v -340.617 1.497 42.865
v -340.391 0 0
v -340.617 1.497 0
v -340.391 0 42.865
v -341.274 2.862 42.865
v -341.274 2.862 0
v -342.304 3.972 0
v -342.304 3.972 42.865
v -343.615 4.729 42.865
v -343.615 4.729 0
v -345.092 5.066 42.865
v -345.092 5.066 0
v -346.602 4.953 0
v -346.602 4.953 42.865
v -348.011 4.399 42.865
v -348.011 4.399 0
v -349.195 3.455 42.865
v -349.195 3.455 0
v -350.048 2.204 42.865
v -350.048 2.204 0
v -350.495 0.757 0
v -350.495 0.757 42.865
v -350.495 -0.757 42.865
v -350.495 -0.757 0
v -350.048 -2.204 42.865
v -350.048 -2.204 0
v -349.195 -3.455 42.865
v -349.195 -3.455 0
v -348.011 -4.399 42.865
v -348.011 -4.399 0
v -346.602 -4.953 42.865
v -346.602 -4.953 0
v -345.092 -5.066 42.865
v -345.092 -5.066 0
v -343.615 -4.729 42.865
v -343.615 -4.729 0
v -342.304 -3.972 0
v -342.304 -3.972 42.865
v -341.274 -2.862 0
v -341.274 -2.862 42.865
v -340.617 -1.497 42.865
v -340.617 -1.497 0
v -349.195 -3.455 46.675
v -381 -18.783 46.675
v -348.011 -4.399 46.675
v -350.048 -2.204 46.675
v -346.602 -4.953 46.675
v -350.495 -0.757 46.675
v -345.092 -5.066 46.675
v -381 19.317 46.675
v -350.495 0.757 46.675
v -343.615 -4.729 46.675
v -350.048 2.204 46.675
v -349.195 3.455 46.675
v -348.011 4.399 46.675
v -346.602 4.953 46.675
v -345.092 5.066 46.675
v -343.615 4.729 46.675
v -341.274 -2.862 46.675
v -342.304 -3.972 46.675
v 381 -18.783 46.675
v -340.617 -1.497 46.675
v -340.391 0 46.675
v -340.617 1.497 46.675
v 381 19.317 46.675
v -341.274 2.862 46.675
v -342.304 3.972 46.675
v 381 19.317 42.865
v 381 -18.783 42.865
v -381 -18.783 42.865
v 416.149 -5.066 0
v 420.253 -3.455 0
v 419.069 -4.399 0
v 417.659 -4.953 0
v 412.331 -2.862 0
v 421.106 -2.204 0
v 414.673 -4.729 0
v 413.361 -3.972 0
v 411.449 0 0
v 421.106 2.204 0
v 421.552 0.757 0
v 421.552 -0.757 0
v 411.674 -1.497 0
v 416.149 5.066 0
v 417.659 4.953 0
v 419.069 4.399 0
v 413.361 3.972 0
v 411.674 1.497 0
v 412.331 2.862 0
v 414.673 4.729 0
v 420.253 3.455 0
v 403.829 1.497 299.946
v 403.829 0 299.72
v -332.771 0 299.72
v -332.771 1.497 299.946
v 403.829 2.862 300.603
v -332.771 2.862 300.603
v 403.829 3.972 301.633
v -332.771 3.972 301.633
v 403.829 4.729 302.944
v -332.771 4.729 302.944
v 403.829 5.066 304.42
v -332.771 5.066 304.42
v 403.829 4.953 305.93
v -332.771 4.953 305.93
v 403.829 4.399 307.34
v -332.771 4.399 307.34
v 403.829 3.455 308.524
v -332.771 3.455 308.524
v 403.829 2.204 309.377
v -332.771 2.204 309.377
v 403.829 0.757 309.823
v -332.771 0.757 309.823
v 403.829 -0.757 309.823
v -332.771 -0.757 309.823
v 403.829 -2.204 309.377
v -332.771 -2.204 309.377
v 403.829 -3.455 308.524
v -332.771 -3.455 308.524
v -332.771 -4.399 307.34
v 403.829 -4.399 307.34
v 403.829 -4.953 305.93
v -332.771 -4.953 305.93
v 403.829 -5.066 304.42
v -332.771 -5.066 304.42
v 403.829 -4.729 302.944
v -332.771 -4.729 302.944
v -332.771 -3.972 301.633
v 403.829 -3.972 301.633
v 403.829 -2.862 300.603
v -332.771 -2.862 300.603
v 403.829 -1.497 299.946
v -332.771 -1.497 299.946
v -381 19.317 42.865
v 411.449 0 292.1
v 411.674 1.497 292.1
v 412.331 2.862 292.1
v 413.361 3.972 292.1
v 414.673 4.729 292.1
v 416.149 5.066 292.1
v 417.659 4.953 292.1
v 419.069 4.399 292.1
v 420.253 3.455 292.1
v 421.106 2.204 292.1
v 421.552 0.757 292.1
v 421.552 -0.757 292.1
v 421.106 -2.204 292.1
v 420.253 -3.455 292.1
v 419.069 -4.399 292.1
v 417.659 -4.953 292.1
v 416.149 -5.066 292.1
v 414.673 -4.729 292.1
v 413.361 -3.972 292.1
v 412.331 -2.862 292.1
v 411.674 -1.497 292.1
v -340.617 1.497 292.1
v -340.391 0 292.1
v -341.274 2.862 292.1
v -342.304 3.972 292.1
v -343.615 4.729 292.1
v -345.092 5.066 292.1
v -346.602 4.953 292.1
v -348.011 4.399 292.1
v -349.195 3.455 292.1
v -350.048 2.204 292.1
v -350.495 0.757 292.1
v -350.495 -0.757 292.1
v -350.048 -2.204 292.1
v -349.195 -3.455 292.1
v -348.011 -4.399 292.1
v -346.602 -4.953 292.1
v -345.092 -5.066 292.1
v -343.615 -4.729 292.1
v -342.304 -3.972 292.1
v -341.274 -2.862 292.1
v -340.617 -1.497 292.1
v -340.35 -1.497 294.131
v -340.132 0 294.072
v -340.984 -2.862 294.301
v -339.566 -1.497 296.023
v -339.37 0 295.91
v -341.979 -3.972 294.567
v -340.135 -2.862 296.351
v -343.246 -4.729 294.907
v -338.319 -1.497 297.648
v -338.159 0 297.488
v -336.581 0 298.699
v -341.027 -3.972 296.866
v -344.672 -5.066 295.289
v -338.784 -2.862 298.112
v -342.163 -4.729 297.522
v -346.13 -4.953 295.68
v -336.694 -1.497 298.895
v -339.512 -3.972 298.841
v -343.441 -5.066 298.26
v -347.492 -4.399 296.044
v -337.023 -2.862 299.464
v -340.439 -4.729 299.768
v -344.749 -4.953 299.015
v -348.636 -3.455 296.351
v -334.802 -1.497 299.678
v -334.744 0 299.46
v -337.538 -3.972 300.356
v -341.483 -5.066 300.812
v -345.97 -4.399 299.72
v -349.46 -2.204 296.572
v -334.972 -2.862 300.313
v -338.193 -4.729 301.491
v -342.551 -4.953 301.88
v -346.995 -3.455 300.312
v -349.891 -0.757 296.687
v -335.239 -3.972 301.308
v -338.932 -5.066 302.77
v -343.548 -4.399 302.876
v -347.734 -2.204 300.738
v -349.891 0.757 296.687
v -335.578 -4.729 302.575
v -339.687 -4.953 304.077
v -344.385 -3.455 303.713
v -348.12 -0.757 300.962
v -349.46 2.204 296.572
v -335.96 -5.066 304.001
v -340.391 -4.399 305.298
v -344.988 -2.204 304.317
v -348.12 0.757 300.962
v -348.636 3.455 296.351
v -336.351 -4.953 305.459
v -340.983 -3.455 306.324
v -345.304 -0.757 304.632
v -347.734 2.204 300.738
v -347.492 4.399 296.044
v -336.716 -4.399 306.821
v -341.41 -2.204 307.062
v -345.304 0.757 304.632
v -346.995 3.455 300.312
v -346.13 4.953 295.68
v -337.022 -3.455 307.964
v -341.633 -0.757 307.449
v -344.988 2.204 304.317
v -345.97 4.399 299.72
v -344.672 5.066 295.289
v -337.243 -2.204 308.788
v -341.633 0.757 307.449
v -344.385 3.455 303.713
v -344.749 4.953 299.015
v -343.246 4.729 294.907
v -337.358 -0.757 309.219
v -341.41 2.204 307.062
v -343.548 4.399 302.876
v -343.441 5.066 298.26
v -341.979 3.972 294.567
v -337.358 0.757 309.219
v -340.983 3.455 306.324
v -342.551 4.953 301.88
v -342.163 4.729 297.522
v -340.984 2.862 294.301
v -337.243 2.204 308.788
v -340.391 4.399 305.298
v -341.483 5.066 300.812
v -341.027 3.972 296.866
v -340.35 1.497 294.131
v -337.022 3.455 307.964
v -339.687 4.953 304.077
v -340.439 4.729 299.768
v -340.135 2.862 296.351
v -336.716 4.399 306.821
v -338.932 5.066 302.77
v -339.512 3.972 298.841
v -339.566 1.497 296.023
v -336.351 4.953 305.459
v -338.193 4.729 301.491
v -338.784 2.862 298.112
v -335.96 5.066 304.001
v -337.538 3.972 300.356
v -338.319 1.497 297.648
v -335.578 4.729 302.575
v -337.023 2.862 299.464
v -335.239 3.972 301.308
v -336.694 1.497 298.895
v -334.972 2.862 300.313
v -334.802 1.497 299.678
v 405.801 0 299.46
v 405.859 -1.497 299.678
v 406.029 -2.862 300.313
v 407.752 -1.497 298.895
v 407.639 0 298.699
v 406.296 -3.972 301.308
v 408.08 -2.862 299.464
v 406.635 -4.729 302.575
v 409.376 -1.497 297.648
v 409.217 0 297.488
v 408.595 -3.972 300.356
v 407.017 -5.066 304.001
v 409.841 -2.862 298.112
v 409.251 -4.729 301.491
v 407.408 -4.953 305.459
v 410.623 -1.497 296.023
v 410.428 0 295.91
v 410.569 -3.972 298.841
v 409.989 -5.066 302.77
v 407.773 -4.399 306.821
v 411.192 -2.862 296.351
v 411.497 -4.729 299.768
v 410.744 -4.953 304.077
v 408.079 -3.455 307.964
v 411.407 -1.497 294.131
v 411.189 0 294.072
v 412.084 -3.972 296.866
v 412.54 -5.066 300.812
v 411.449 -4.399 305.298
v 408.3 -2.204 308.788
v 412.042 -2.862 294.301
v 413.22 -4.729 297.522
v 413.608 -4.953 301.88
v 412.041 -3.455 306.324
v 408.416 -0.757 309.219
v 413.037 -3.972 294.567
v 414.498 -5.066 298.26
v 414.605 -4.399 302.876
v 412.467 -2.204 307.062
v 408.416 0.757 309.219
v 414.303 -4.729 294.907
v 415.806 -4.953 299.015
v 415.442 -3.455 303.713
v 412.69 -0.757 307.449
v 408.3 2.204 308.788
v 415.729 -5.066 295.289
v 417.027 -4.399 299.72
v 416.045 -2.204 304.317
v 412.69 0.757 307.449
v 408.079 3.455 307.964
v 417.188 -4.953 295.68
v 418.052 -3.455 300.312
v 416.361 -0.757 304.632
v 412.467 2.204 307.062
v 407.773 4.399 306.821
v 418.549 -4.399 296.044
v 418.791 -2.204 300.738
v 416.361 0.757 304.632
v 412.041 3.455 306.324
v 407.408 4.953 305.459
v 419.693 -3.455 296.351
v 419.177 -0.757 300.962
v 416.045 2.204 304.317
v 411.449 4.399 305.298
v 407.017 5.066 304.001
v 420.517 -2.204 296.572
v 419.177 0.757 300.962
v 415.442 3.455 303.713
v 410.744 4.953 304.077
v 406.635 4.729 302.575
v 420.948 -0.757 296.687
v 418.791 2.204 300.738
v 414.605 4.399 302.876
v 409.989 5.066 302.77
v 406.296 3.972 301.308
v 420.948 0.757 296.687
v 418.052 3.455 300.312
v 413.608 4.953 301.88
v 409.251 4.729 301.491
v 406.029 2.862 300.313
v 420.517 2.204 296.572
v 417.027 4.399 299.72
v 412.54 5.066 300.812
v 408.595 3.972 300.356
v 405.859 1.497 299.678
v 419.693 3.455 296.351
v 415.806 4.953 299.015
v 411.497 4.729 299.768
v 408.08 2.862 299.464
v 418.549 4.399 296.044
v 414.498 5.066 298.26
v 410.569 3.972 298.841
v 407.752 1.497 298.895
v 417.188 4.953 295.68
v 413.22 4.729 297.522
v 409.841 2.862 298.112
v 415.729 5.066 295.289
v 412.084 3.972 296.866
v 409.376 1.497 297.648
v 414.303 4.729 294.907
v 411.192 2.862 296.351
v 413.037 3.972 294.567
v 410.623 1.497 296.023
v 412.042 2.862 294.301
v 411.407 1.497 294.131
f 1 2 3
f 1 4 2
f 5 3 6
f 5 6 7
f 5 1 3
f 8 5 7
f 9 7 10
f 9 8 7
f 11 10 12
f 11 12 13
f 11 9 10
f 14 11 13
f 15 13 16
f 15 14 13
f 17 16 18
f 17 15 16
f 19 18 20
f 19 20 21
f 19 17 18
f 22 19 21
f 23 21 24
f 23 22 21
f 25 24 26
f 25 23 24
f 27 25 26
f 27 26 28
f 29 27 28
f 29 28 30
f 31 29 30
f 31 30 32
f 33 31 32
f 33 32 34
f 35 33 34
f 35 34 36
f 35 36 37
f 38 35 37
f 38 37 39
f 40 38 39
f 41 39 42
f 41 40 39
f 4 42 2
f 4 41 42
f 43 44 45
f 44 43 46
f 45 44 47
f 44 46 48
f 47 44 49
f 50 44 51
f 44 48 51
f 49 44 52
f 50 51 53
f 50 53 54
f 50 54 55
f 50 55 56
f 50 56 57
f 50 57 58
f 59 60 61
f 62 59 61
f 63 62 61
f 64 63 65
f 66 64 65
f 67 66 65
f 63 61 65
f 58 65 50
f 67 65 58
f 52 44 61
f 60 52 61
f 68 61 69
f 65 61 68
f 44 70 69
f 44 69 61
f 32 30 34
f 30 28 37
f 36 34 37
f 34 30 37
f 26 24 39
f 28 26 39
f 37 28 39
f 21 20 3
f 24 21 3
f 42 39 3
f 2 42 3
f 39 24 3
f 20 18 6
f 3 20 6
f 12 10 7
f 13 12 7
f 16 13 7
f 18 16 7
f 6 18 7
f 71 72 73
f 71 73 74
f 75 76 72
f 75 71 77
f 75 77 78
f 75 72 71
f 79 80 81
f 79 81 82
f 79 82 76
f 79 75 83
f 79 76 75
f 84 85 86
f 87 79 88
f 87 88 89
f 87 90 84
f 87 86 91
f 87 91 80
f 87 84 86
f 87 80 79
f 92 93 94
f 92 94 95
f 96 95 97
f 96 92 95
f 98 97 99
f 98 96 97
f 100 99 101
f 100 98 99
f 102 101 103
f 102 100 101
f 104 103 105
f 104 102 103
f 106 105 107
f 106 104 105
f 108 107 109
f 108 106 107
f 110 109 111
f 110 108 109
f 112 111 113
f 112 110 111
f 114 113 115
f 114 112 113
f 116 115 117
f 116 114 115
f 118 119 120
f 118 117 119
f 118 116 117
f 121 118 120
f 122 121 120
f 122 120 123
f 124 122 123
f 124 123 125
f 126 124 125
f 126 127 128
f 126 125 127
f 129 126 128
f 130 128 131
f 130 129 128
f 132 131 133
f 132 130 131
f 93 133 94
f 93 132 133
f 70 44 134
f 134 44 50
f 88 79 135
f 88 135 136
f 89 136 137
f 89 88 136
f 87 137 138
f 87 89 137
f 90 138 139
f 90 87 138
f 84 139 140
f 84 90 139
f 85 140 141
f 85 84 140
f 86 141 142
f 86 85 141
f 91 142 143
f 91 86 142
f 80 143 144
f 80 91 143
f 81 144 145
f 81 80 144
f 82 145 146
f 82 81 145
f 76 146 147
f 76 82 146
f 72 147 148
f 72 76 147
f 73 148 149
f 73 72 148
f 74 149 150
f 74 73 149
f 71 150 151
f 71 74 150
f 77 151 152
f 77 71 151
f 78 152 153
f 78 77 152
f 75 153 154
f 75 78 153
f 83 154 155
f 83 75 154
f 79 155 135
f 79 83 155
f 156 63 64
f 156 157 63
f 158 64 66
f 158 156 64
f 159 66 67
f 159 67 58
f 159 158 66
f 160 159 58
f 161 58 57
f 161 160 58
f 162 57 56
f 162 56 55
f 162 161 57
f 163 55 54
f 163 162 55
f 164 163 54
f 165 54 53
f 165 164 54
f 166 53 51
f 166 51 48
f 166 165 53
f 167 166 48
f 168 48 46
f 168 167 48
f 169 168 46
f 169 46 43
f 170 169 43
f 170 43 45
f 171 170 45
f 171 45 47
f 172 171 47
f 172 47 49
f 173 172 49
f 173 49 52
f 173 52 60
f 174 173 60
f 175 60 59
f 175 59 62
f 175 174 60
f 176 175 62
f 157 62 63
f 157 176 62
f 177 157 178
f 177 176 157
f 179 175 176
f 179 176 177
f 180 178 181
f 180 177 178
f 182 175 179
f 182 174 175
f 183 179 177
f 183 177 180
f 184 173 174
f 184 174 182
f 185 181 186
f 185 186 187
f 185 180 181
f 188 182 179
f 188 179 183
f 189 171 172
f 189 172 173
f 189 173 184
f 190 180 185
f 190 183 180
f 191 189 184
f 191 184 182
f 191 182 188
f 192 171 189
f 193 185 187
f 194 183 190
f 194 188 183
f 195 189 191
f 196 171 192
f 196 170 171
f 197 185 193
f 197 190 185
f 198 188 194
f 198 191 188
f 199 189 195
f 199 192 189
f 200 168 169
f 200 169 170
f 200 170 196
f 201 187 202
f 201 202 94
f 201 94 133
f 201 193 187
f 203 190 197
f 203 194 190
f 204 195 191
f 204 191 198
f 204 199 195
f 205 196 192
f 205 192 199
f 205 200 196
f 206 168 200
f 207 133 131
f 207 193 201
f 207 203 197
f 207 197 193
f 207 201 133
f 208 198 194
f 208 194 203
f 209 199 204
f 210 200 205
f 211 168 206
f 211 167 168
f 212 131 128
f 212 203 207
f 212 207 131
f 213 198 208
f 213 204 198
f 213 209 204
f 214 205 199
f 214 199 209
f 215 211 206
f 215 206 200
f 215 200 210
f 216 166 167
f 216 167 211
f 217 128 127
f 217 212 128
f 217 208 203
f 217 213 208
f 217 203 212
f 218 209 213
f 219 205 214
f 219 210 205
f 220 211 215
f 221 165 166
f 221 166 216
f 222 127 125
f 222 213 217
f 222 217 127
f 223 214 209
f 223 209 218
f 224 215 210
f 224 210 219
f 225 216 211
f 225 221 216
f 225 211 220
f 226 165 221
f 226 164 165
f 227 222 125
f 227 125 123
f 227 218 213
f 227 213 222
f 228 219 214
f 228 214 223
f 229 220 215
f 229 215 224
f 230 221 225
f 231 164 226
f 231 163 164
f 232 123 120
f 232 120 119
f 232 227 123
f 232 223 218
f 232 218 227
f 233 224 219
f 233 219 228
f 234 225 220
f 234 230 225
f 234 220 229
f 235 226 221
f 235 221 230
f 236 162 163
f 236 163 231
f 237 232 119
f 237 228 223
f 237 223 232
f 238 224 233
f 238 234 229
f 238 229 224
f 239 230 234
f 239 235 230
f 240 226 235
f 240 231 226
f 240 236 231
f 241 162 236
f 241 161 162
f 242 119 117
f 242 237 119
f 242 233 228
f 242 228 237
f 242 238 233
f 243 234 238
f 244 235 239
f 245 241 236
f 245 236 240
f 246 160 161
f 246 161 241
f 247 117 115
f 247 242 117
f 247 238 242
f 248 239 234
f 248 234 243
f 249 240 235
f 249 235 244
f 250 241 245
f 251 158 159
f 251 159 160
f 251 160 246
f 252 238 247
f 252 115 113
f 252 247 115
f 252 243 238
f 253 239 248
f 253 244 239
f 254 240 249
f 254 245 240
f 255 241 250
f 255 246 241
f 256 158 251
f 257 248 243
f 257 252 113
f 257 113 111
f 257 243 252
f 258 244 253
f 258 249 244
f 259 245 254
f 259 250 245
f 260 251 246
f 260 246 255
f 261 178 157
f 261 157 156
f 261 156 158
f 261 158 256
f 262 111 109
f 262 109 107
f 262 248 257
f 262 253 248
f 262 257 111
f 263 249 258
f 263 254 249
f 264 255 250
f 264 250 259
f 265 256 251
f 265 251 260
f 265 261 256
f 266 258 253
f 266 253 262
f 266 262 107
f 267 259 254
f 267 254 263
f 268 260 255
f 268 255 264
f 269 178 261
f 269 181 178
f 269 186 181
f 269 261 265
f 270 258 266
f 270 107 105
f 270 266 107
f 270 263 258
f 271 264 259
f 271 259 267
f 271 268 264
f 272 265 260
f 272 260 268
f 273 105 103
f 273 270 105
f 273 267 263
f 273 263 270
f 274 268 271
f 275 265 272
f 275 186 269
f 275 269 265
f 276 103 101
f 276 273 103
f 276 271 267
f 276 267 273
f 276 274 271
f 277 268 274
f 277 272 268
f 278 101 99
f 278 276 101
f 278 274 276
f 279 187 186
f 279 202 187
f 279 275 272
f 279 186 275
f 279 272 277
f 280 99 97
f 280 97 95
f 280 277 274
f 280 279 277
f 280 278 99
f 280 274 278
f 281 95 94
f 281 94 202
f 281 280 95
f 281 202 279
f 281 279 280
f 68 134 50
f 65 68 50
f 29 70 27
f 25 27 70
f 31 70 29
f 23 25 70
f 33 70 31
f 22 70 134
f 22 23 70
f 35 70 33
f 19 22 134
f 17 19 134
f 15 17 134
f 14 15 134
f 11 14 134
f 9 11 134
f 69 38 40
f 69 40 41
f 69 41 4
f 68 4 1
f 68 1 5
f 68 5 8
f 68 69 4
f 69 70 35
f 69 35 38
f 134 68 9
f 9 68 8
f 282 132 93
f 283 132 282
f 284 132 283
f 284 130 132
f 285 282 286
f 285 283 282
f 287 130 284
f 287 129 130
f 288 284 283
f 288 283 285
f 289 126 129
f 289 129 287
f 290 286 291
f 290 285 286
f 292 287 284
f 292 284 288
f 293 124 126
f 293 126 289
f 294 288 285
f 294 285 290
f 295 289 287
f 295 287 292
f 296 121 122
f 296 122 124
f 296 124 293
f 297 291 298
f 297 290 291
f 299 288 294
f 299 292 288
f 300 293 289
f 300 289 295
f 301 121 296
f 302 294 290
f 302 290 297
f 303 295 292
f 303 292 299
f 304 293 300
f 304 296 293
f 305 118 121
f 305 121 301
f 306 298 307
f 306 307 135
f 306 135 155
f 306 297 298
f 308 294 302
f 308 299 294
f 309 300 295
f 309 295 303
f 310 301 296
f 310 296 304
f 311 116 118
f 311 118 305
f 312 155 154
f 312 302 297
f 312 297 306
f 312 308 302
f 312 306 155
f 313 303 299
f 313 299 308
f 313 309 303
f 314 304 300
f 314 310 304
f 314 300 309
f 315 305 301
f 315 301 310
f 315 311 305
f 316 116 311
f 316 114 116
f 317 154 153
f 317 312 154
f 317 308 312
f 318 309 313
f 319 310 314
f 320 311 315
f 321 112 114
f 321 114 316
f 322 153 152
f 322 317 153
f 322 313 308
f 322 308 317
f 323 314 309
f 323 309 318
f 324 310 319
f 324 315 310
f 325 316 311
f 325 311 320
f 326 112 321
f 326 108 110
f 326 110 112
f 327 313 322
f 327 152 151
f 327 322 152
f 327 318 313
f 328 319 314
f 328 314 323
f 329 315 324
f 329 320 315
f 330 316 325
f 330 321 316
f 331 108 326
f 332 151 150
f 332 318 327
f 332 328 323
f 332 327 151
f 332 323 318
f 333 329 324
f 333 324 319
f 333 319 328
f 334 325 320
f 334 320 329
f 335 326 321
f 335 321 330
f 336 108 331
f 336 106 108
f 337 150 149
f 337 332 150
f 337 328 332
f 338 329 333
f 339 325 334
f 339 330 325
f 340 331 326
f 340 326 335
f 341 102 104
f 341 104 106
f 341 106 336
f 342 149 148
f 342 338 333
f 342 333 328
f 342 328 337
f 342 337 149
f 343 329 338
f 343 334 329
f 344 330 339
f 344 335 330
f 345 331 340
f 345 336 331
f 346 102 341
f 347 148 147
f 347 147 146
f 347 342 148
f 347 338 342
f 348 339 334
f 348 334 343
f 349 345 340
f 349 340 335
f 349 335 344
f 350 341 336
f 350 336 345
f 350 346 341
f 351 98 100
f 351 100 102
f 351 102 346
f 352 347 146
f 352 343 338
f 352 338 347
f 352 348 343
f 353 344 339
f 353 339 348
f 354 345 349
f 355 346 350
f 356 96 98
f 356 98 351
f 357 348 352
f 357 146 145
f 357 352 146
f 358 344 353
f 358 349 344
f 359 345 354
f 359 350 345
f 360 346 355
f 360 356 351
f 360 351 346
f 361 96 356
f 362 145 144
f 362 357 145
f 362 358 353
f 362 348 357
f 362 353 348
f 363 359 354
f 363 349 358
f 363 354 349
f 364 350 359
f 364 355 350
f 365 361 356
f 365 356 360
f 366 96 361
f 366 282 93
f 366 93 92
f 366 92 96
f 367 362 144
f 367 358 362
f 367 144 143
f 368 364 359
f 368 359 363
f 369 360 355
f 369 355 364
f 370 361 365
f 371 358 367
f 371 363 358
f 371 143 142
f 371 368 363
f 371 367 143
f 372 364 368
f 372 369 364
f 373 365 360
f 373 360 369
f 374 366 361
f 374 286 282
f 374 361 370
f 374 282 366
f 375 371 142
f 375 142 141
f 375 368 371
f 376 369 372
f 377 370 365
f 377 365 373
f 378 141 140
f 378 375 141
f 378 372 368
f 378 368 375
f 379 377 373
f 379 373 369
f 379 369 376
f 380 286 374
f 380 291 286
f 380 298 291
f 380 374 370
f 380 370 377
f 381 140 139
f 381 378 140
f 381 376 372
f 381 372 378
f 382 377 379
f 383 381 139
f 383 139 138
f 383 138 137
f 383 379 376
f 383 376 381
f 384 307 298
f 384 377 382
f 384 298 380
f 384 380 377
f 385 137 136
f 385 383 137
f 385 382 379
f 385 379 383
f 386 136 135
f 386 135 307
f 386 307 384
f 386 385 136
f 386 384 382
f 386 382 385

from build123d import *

# Parameters (mm, degrees)
F1_R     = 5.08
F3_W     = 38.1
F3_H     = 3.81
F4_DEPTH = 381


with BuildPart() as f2:
    # F2: sweep along a path in F0
    with BuildLine(Plane.XZ) as f2_path:
        Line((-345.471335, 0), (-345.471335, 292.1))
        ThreePointArc((-345.471335, 292.1), (-341.751591, 301.080256), (-332.771335, 304.8))
        Line((-332.771335, 304.8), (403.828665, 304.8))
        ThreePointArc((403.828665, 304.8), (412.808921, 301.080256), (416.528665, 292.1))
        Line((416.528665, 292.1), (416.528665, 0))
    # F1 (on Top) → F2 (sweep)
    with BuildSketch(Plane.XY):
        with Locations((-345.471335, 0)):
            Circle(F1_R)
    sweep(path=f2_path.line)

    # F3 (on Right) → F4 (join, symmetric)
    with BuildSketch(Plane.YZ):
        with Locations((0.267047, 44.76991)):
            Rectangle(F3_W, F3_H)
    extrude(amount=F4_DEPTH, both=True)


solid = f2.part
